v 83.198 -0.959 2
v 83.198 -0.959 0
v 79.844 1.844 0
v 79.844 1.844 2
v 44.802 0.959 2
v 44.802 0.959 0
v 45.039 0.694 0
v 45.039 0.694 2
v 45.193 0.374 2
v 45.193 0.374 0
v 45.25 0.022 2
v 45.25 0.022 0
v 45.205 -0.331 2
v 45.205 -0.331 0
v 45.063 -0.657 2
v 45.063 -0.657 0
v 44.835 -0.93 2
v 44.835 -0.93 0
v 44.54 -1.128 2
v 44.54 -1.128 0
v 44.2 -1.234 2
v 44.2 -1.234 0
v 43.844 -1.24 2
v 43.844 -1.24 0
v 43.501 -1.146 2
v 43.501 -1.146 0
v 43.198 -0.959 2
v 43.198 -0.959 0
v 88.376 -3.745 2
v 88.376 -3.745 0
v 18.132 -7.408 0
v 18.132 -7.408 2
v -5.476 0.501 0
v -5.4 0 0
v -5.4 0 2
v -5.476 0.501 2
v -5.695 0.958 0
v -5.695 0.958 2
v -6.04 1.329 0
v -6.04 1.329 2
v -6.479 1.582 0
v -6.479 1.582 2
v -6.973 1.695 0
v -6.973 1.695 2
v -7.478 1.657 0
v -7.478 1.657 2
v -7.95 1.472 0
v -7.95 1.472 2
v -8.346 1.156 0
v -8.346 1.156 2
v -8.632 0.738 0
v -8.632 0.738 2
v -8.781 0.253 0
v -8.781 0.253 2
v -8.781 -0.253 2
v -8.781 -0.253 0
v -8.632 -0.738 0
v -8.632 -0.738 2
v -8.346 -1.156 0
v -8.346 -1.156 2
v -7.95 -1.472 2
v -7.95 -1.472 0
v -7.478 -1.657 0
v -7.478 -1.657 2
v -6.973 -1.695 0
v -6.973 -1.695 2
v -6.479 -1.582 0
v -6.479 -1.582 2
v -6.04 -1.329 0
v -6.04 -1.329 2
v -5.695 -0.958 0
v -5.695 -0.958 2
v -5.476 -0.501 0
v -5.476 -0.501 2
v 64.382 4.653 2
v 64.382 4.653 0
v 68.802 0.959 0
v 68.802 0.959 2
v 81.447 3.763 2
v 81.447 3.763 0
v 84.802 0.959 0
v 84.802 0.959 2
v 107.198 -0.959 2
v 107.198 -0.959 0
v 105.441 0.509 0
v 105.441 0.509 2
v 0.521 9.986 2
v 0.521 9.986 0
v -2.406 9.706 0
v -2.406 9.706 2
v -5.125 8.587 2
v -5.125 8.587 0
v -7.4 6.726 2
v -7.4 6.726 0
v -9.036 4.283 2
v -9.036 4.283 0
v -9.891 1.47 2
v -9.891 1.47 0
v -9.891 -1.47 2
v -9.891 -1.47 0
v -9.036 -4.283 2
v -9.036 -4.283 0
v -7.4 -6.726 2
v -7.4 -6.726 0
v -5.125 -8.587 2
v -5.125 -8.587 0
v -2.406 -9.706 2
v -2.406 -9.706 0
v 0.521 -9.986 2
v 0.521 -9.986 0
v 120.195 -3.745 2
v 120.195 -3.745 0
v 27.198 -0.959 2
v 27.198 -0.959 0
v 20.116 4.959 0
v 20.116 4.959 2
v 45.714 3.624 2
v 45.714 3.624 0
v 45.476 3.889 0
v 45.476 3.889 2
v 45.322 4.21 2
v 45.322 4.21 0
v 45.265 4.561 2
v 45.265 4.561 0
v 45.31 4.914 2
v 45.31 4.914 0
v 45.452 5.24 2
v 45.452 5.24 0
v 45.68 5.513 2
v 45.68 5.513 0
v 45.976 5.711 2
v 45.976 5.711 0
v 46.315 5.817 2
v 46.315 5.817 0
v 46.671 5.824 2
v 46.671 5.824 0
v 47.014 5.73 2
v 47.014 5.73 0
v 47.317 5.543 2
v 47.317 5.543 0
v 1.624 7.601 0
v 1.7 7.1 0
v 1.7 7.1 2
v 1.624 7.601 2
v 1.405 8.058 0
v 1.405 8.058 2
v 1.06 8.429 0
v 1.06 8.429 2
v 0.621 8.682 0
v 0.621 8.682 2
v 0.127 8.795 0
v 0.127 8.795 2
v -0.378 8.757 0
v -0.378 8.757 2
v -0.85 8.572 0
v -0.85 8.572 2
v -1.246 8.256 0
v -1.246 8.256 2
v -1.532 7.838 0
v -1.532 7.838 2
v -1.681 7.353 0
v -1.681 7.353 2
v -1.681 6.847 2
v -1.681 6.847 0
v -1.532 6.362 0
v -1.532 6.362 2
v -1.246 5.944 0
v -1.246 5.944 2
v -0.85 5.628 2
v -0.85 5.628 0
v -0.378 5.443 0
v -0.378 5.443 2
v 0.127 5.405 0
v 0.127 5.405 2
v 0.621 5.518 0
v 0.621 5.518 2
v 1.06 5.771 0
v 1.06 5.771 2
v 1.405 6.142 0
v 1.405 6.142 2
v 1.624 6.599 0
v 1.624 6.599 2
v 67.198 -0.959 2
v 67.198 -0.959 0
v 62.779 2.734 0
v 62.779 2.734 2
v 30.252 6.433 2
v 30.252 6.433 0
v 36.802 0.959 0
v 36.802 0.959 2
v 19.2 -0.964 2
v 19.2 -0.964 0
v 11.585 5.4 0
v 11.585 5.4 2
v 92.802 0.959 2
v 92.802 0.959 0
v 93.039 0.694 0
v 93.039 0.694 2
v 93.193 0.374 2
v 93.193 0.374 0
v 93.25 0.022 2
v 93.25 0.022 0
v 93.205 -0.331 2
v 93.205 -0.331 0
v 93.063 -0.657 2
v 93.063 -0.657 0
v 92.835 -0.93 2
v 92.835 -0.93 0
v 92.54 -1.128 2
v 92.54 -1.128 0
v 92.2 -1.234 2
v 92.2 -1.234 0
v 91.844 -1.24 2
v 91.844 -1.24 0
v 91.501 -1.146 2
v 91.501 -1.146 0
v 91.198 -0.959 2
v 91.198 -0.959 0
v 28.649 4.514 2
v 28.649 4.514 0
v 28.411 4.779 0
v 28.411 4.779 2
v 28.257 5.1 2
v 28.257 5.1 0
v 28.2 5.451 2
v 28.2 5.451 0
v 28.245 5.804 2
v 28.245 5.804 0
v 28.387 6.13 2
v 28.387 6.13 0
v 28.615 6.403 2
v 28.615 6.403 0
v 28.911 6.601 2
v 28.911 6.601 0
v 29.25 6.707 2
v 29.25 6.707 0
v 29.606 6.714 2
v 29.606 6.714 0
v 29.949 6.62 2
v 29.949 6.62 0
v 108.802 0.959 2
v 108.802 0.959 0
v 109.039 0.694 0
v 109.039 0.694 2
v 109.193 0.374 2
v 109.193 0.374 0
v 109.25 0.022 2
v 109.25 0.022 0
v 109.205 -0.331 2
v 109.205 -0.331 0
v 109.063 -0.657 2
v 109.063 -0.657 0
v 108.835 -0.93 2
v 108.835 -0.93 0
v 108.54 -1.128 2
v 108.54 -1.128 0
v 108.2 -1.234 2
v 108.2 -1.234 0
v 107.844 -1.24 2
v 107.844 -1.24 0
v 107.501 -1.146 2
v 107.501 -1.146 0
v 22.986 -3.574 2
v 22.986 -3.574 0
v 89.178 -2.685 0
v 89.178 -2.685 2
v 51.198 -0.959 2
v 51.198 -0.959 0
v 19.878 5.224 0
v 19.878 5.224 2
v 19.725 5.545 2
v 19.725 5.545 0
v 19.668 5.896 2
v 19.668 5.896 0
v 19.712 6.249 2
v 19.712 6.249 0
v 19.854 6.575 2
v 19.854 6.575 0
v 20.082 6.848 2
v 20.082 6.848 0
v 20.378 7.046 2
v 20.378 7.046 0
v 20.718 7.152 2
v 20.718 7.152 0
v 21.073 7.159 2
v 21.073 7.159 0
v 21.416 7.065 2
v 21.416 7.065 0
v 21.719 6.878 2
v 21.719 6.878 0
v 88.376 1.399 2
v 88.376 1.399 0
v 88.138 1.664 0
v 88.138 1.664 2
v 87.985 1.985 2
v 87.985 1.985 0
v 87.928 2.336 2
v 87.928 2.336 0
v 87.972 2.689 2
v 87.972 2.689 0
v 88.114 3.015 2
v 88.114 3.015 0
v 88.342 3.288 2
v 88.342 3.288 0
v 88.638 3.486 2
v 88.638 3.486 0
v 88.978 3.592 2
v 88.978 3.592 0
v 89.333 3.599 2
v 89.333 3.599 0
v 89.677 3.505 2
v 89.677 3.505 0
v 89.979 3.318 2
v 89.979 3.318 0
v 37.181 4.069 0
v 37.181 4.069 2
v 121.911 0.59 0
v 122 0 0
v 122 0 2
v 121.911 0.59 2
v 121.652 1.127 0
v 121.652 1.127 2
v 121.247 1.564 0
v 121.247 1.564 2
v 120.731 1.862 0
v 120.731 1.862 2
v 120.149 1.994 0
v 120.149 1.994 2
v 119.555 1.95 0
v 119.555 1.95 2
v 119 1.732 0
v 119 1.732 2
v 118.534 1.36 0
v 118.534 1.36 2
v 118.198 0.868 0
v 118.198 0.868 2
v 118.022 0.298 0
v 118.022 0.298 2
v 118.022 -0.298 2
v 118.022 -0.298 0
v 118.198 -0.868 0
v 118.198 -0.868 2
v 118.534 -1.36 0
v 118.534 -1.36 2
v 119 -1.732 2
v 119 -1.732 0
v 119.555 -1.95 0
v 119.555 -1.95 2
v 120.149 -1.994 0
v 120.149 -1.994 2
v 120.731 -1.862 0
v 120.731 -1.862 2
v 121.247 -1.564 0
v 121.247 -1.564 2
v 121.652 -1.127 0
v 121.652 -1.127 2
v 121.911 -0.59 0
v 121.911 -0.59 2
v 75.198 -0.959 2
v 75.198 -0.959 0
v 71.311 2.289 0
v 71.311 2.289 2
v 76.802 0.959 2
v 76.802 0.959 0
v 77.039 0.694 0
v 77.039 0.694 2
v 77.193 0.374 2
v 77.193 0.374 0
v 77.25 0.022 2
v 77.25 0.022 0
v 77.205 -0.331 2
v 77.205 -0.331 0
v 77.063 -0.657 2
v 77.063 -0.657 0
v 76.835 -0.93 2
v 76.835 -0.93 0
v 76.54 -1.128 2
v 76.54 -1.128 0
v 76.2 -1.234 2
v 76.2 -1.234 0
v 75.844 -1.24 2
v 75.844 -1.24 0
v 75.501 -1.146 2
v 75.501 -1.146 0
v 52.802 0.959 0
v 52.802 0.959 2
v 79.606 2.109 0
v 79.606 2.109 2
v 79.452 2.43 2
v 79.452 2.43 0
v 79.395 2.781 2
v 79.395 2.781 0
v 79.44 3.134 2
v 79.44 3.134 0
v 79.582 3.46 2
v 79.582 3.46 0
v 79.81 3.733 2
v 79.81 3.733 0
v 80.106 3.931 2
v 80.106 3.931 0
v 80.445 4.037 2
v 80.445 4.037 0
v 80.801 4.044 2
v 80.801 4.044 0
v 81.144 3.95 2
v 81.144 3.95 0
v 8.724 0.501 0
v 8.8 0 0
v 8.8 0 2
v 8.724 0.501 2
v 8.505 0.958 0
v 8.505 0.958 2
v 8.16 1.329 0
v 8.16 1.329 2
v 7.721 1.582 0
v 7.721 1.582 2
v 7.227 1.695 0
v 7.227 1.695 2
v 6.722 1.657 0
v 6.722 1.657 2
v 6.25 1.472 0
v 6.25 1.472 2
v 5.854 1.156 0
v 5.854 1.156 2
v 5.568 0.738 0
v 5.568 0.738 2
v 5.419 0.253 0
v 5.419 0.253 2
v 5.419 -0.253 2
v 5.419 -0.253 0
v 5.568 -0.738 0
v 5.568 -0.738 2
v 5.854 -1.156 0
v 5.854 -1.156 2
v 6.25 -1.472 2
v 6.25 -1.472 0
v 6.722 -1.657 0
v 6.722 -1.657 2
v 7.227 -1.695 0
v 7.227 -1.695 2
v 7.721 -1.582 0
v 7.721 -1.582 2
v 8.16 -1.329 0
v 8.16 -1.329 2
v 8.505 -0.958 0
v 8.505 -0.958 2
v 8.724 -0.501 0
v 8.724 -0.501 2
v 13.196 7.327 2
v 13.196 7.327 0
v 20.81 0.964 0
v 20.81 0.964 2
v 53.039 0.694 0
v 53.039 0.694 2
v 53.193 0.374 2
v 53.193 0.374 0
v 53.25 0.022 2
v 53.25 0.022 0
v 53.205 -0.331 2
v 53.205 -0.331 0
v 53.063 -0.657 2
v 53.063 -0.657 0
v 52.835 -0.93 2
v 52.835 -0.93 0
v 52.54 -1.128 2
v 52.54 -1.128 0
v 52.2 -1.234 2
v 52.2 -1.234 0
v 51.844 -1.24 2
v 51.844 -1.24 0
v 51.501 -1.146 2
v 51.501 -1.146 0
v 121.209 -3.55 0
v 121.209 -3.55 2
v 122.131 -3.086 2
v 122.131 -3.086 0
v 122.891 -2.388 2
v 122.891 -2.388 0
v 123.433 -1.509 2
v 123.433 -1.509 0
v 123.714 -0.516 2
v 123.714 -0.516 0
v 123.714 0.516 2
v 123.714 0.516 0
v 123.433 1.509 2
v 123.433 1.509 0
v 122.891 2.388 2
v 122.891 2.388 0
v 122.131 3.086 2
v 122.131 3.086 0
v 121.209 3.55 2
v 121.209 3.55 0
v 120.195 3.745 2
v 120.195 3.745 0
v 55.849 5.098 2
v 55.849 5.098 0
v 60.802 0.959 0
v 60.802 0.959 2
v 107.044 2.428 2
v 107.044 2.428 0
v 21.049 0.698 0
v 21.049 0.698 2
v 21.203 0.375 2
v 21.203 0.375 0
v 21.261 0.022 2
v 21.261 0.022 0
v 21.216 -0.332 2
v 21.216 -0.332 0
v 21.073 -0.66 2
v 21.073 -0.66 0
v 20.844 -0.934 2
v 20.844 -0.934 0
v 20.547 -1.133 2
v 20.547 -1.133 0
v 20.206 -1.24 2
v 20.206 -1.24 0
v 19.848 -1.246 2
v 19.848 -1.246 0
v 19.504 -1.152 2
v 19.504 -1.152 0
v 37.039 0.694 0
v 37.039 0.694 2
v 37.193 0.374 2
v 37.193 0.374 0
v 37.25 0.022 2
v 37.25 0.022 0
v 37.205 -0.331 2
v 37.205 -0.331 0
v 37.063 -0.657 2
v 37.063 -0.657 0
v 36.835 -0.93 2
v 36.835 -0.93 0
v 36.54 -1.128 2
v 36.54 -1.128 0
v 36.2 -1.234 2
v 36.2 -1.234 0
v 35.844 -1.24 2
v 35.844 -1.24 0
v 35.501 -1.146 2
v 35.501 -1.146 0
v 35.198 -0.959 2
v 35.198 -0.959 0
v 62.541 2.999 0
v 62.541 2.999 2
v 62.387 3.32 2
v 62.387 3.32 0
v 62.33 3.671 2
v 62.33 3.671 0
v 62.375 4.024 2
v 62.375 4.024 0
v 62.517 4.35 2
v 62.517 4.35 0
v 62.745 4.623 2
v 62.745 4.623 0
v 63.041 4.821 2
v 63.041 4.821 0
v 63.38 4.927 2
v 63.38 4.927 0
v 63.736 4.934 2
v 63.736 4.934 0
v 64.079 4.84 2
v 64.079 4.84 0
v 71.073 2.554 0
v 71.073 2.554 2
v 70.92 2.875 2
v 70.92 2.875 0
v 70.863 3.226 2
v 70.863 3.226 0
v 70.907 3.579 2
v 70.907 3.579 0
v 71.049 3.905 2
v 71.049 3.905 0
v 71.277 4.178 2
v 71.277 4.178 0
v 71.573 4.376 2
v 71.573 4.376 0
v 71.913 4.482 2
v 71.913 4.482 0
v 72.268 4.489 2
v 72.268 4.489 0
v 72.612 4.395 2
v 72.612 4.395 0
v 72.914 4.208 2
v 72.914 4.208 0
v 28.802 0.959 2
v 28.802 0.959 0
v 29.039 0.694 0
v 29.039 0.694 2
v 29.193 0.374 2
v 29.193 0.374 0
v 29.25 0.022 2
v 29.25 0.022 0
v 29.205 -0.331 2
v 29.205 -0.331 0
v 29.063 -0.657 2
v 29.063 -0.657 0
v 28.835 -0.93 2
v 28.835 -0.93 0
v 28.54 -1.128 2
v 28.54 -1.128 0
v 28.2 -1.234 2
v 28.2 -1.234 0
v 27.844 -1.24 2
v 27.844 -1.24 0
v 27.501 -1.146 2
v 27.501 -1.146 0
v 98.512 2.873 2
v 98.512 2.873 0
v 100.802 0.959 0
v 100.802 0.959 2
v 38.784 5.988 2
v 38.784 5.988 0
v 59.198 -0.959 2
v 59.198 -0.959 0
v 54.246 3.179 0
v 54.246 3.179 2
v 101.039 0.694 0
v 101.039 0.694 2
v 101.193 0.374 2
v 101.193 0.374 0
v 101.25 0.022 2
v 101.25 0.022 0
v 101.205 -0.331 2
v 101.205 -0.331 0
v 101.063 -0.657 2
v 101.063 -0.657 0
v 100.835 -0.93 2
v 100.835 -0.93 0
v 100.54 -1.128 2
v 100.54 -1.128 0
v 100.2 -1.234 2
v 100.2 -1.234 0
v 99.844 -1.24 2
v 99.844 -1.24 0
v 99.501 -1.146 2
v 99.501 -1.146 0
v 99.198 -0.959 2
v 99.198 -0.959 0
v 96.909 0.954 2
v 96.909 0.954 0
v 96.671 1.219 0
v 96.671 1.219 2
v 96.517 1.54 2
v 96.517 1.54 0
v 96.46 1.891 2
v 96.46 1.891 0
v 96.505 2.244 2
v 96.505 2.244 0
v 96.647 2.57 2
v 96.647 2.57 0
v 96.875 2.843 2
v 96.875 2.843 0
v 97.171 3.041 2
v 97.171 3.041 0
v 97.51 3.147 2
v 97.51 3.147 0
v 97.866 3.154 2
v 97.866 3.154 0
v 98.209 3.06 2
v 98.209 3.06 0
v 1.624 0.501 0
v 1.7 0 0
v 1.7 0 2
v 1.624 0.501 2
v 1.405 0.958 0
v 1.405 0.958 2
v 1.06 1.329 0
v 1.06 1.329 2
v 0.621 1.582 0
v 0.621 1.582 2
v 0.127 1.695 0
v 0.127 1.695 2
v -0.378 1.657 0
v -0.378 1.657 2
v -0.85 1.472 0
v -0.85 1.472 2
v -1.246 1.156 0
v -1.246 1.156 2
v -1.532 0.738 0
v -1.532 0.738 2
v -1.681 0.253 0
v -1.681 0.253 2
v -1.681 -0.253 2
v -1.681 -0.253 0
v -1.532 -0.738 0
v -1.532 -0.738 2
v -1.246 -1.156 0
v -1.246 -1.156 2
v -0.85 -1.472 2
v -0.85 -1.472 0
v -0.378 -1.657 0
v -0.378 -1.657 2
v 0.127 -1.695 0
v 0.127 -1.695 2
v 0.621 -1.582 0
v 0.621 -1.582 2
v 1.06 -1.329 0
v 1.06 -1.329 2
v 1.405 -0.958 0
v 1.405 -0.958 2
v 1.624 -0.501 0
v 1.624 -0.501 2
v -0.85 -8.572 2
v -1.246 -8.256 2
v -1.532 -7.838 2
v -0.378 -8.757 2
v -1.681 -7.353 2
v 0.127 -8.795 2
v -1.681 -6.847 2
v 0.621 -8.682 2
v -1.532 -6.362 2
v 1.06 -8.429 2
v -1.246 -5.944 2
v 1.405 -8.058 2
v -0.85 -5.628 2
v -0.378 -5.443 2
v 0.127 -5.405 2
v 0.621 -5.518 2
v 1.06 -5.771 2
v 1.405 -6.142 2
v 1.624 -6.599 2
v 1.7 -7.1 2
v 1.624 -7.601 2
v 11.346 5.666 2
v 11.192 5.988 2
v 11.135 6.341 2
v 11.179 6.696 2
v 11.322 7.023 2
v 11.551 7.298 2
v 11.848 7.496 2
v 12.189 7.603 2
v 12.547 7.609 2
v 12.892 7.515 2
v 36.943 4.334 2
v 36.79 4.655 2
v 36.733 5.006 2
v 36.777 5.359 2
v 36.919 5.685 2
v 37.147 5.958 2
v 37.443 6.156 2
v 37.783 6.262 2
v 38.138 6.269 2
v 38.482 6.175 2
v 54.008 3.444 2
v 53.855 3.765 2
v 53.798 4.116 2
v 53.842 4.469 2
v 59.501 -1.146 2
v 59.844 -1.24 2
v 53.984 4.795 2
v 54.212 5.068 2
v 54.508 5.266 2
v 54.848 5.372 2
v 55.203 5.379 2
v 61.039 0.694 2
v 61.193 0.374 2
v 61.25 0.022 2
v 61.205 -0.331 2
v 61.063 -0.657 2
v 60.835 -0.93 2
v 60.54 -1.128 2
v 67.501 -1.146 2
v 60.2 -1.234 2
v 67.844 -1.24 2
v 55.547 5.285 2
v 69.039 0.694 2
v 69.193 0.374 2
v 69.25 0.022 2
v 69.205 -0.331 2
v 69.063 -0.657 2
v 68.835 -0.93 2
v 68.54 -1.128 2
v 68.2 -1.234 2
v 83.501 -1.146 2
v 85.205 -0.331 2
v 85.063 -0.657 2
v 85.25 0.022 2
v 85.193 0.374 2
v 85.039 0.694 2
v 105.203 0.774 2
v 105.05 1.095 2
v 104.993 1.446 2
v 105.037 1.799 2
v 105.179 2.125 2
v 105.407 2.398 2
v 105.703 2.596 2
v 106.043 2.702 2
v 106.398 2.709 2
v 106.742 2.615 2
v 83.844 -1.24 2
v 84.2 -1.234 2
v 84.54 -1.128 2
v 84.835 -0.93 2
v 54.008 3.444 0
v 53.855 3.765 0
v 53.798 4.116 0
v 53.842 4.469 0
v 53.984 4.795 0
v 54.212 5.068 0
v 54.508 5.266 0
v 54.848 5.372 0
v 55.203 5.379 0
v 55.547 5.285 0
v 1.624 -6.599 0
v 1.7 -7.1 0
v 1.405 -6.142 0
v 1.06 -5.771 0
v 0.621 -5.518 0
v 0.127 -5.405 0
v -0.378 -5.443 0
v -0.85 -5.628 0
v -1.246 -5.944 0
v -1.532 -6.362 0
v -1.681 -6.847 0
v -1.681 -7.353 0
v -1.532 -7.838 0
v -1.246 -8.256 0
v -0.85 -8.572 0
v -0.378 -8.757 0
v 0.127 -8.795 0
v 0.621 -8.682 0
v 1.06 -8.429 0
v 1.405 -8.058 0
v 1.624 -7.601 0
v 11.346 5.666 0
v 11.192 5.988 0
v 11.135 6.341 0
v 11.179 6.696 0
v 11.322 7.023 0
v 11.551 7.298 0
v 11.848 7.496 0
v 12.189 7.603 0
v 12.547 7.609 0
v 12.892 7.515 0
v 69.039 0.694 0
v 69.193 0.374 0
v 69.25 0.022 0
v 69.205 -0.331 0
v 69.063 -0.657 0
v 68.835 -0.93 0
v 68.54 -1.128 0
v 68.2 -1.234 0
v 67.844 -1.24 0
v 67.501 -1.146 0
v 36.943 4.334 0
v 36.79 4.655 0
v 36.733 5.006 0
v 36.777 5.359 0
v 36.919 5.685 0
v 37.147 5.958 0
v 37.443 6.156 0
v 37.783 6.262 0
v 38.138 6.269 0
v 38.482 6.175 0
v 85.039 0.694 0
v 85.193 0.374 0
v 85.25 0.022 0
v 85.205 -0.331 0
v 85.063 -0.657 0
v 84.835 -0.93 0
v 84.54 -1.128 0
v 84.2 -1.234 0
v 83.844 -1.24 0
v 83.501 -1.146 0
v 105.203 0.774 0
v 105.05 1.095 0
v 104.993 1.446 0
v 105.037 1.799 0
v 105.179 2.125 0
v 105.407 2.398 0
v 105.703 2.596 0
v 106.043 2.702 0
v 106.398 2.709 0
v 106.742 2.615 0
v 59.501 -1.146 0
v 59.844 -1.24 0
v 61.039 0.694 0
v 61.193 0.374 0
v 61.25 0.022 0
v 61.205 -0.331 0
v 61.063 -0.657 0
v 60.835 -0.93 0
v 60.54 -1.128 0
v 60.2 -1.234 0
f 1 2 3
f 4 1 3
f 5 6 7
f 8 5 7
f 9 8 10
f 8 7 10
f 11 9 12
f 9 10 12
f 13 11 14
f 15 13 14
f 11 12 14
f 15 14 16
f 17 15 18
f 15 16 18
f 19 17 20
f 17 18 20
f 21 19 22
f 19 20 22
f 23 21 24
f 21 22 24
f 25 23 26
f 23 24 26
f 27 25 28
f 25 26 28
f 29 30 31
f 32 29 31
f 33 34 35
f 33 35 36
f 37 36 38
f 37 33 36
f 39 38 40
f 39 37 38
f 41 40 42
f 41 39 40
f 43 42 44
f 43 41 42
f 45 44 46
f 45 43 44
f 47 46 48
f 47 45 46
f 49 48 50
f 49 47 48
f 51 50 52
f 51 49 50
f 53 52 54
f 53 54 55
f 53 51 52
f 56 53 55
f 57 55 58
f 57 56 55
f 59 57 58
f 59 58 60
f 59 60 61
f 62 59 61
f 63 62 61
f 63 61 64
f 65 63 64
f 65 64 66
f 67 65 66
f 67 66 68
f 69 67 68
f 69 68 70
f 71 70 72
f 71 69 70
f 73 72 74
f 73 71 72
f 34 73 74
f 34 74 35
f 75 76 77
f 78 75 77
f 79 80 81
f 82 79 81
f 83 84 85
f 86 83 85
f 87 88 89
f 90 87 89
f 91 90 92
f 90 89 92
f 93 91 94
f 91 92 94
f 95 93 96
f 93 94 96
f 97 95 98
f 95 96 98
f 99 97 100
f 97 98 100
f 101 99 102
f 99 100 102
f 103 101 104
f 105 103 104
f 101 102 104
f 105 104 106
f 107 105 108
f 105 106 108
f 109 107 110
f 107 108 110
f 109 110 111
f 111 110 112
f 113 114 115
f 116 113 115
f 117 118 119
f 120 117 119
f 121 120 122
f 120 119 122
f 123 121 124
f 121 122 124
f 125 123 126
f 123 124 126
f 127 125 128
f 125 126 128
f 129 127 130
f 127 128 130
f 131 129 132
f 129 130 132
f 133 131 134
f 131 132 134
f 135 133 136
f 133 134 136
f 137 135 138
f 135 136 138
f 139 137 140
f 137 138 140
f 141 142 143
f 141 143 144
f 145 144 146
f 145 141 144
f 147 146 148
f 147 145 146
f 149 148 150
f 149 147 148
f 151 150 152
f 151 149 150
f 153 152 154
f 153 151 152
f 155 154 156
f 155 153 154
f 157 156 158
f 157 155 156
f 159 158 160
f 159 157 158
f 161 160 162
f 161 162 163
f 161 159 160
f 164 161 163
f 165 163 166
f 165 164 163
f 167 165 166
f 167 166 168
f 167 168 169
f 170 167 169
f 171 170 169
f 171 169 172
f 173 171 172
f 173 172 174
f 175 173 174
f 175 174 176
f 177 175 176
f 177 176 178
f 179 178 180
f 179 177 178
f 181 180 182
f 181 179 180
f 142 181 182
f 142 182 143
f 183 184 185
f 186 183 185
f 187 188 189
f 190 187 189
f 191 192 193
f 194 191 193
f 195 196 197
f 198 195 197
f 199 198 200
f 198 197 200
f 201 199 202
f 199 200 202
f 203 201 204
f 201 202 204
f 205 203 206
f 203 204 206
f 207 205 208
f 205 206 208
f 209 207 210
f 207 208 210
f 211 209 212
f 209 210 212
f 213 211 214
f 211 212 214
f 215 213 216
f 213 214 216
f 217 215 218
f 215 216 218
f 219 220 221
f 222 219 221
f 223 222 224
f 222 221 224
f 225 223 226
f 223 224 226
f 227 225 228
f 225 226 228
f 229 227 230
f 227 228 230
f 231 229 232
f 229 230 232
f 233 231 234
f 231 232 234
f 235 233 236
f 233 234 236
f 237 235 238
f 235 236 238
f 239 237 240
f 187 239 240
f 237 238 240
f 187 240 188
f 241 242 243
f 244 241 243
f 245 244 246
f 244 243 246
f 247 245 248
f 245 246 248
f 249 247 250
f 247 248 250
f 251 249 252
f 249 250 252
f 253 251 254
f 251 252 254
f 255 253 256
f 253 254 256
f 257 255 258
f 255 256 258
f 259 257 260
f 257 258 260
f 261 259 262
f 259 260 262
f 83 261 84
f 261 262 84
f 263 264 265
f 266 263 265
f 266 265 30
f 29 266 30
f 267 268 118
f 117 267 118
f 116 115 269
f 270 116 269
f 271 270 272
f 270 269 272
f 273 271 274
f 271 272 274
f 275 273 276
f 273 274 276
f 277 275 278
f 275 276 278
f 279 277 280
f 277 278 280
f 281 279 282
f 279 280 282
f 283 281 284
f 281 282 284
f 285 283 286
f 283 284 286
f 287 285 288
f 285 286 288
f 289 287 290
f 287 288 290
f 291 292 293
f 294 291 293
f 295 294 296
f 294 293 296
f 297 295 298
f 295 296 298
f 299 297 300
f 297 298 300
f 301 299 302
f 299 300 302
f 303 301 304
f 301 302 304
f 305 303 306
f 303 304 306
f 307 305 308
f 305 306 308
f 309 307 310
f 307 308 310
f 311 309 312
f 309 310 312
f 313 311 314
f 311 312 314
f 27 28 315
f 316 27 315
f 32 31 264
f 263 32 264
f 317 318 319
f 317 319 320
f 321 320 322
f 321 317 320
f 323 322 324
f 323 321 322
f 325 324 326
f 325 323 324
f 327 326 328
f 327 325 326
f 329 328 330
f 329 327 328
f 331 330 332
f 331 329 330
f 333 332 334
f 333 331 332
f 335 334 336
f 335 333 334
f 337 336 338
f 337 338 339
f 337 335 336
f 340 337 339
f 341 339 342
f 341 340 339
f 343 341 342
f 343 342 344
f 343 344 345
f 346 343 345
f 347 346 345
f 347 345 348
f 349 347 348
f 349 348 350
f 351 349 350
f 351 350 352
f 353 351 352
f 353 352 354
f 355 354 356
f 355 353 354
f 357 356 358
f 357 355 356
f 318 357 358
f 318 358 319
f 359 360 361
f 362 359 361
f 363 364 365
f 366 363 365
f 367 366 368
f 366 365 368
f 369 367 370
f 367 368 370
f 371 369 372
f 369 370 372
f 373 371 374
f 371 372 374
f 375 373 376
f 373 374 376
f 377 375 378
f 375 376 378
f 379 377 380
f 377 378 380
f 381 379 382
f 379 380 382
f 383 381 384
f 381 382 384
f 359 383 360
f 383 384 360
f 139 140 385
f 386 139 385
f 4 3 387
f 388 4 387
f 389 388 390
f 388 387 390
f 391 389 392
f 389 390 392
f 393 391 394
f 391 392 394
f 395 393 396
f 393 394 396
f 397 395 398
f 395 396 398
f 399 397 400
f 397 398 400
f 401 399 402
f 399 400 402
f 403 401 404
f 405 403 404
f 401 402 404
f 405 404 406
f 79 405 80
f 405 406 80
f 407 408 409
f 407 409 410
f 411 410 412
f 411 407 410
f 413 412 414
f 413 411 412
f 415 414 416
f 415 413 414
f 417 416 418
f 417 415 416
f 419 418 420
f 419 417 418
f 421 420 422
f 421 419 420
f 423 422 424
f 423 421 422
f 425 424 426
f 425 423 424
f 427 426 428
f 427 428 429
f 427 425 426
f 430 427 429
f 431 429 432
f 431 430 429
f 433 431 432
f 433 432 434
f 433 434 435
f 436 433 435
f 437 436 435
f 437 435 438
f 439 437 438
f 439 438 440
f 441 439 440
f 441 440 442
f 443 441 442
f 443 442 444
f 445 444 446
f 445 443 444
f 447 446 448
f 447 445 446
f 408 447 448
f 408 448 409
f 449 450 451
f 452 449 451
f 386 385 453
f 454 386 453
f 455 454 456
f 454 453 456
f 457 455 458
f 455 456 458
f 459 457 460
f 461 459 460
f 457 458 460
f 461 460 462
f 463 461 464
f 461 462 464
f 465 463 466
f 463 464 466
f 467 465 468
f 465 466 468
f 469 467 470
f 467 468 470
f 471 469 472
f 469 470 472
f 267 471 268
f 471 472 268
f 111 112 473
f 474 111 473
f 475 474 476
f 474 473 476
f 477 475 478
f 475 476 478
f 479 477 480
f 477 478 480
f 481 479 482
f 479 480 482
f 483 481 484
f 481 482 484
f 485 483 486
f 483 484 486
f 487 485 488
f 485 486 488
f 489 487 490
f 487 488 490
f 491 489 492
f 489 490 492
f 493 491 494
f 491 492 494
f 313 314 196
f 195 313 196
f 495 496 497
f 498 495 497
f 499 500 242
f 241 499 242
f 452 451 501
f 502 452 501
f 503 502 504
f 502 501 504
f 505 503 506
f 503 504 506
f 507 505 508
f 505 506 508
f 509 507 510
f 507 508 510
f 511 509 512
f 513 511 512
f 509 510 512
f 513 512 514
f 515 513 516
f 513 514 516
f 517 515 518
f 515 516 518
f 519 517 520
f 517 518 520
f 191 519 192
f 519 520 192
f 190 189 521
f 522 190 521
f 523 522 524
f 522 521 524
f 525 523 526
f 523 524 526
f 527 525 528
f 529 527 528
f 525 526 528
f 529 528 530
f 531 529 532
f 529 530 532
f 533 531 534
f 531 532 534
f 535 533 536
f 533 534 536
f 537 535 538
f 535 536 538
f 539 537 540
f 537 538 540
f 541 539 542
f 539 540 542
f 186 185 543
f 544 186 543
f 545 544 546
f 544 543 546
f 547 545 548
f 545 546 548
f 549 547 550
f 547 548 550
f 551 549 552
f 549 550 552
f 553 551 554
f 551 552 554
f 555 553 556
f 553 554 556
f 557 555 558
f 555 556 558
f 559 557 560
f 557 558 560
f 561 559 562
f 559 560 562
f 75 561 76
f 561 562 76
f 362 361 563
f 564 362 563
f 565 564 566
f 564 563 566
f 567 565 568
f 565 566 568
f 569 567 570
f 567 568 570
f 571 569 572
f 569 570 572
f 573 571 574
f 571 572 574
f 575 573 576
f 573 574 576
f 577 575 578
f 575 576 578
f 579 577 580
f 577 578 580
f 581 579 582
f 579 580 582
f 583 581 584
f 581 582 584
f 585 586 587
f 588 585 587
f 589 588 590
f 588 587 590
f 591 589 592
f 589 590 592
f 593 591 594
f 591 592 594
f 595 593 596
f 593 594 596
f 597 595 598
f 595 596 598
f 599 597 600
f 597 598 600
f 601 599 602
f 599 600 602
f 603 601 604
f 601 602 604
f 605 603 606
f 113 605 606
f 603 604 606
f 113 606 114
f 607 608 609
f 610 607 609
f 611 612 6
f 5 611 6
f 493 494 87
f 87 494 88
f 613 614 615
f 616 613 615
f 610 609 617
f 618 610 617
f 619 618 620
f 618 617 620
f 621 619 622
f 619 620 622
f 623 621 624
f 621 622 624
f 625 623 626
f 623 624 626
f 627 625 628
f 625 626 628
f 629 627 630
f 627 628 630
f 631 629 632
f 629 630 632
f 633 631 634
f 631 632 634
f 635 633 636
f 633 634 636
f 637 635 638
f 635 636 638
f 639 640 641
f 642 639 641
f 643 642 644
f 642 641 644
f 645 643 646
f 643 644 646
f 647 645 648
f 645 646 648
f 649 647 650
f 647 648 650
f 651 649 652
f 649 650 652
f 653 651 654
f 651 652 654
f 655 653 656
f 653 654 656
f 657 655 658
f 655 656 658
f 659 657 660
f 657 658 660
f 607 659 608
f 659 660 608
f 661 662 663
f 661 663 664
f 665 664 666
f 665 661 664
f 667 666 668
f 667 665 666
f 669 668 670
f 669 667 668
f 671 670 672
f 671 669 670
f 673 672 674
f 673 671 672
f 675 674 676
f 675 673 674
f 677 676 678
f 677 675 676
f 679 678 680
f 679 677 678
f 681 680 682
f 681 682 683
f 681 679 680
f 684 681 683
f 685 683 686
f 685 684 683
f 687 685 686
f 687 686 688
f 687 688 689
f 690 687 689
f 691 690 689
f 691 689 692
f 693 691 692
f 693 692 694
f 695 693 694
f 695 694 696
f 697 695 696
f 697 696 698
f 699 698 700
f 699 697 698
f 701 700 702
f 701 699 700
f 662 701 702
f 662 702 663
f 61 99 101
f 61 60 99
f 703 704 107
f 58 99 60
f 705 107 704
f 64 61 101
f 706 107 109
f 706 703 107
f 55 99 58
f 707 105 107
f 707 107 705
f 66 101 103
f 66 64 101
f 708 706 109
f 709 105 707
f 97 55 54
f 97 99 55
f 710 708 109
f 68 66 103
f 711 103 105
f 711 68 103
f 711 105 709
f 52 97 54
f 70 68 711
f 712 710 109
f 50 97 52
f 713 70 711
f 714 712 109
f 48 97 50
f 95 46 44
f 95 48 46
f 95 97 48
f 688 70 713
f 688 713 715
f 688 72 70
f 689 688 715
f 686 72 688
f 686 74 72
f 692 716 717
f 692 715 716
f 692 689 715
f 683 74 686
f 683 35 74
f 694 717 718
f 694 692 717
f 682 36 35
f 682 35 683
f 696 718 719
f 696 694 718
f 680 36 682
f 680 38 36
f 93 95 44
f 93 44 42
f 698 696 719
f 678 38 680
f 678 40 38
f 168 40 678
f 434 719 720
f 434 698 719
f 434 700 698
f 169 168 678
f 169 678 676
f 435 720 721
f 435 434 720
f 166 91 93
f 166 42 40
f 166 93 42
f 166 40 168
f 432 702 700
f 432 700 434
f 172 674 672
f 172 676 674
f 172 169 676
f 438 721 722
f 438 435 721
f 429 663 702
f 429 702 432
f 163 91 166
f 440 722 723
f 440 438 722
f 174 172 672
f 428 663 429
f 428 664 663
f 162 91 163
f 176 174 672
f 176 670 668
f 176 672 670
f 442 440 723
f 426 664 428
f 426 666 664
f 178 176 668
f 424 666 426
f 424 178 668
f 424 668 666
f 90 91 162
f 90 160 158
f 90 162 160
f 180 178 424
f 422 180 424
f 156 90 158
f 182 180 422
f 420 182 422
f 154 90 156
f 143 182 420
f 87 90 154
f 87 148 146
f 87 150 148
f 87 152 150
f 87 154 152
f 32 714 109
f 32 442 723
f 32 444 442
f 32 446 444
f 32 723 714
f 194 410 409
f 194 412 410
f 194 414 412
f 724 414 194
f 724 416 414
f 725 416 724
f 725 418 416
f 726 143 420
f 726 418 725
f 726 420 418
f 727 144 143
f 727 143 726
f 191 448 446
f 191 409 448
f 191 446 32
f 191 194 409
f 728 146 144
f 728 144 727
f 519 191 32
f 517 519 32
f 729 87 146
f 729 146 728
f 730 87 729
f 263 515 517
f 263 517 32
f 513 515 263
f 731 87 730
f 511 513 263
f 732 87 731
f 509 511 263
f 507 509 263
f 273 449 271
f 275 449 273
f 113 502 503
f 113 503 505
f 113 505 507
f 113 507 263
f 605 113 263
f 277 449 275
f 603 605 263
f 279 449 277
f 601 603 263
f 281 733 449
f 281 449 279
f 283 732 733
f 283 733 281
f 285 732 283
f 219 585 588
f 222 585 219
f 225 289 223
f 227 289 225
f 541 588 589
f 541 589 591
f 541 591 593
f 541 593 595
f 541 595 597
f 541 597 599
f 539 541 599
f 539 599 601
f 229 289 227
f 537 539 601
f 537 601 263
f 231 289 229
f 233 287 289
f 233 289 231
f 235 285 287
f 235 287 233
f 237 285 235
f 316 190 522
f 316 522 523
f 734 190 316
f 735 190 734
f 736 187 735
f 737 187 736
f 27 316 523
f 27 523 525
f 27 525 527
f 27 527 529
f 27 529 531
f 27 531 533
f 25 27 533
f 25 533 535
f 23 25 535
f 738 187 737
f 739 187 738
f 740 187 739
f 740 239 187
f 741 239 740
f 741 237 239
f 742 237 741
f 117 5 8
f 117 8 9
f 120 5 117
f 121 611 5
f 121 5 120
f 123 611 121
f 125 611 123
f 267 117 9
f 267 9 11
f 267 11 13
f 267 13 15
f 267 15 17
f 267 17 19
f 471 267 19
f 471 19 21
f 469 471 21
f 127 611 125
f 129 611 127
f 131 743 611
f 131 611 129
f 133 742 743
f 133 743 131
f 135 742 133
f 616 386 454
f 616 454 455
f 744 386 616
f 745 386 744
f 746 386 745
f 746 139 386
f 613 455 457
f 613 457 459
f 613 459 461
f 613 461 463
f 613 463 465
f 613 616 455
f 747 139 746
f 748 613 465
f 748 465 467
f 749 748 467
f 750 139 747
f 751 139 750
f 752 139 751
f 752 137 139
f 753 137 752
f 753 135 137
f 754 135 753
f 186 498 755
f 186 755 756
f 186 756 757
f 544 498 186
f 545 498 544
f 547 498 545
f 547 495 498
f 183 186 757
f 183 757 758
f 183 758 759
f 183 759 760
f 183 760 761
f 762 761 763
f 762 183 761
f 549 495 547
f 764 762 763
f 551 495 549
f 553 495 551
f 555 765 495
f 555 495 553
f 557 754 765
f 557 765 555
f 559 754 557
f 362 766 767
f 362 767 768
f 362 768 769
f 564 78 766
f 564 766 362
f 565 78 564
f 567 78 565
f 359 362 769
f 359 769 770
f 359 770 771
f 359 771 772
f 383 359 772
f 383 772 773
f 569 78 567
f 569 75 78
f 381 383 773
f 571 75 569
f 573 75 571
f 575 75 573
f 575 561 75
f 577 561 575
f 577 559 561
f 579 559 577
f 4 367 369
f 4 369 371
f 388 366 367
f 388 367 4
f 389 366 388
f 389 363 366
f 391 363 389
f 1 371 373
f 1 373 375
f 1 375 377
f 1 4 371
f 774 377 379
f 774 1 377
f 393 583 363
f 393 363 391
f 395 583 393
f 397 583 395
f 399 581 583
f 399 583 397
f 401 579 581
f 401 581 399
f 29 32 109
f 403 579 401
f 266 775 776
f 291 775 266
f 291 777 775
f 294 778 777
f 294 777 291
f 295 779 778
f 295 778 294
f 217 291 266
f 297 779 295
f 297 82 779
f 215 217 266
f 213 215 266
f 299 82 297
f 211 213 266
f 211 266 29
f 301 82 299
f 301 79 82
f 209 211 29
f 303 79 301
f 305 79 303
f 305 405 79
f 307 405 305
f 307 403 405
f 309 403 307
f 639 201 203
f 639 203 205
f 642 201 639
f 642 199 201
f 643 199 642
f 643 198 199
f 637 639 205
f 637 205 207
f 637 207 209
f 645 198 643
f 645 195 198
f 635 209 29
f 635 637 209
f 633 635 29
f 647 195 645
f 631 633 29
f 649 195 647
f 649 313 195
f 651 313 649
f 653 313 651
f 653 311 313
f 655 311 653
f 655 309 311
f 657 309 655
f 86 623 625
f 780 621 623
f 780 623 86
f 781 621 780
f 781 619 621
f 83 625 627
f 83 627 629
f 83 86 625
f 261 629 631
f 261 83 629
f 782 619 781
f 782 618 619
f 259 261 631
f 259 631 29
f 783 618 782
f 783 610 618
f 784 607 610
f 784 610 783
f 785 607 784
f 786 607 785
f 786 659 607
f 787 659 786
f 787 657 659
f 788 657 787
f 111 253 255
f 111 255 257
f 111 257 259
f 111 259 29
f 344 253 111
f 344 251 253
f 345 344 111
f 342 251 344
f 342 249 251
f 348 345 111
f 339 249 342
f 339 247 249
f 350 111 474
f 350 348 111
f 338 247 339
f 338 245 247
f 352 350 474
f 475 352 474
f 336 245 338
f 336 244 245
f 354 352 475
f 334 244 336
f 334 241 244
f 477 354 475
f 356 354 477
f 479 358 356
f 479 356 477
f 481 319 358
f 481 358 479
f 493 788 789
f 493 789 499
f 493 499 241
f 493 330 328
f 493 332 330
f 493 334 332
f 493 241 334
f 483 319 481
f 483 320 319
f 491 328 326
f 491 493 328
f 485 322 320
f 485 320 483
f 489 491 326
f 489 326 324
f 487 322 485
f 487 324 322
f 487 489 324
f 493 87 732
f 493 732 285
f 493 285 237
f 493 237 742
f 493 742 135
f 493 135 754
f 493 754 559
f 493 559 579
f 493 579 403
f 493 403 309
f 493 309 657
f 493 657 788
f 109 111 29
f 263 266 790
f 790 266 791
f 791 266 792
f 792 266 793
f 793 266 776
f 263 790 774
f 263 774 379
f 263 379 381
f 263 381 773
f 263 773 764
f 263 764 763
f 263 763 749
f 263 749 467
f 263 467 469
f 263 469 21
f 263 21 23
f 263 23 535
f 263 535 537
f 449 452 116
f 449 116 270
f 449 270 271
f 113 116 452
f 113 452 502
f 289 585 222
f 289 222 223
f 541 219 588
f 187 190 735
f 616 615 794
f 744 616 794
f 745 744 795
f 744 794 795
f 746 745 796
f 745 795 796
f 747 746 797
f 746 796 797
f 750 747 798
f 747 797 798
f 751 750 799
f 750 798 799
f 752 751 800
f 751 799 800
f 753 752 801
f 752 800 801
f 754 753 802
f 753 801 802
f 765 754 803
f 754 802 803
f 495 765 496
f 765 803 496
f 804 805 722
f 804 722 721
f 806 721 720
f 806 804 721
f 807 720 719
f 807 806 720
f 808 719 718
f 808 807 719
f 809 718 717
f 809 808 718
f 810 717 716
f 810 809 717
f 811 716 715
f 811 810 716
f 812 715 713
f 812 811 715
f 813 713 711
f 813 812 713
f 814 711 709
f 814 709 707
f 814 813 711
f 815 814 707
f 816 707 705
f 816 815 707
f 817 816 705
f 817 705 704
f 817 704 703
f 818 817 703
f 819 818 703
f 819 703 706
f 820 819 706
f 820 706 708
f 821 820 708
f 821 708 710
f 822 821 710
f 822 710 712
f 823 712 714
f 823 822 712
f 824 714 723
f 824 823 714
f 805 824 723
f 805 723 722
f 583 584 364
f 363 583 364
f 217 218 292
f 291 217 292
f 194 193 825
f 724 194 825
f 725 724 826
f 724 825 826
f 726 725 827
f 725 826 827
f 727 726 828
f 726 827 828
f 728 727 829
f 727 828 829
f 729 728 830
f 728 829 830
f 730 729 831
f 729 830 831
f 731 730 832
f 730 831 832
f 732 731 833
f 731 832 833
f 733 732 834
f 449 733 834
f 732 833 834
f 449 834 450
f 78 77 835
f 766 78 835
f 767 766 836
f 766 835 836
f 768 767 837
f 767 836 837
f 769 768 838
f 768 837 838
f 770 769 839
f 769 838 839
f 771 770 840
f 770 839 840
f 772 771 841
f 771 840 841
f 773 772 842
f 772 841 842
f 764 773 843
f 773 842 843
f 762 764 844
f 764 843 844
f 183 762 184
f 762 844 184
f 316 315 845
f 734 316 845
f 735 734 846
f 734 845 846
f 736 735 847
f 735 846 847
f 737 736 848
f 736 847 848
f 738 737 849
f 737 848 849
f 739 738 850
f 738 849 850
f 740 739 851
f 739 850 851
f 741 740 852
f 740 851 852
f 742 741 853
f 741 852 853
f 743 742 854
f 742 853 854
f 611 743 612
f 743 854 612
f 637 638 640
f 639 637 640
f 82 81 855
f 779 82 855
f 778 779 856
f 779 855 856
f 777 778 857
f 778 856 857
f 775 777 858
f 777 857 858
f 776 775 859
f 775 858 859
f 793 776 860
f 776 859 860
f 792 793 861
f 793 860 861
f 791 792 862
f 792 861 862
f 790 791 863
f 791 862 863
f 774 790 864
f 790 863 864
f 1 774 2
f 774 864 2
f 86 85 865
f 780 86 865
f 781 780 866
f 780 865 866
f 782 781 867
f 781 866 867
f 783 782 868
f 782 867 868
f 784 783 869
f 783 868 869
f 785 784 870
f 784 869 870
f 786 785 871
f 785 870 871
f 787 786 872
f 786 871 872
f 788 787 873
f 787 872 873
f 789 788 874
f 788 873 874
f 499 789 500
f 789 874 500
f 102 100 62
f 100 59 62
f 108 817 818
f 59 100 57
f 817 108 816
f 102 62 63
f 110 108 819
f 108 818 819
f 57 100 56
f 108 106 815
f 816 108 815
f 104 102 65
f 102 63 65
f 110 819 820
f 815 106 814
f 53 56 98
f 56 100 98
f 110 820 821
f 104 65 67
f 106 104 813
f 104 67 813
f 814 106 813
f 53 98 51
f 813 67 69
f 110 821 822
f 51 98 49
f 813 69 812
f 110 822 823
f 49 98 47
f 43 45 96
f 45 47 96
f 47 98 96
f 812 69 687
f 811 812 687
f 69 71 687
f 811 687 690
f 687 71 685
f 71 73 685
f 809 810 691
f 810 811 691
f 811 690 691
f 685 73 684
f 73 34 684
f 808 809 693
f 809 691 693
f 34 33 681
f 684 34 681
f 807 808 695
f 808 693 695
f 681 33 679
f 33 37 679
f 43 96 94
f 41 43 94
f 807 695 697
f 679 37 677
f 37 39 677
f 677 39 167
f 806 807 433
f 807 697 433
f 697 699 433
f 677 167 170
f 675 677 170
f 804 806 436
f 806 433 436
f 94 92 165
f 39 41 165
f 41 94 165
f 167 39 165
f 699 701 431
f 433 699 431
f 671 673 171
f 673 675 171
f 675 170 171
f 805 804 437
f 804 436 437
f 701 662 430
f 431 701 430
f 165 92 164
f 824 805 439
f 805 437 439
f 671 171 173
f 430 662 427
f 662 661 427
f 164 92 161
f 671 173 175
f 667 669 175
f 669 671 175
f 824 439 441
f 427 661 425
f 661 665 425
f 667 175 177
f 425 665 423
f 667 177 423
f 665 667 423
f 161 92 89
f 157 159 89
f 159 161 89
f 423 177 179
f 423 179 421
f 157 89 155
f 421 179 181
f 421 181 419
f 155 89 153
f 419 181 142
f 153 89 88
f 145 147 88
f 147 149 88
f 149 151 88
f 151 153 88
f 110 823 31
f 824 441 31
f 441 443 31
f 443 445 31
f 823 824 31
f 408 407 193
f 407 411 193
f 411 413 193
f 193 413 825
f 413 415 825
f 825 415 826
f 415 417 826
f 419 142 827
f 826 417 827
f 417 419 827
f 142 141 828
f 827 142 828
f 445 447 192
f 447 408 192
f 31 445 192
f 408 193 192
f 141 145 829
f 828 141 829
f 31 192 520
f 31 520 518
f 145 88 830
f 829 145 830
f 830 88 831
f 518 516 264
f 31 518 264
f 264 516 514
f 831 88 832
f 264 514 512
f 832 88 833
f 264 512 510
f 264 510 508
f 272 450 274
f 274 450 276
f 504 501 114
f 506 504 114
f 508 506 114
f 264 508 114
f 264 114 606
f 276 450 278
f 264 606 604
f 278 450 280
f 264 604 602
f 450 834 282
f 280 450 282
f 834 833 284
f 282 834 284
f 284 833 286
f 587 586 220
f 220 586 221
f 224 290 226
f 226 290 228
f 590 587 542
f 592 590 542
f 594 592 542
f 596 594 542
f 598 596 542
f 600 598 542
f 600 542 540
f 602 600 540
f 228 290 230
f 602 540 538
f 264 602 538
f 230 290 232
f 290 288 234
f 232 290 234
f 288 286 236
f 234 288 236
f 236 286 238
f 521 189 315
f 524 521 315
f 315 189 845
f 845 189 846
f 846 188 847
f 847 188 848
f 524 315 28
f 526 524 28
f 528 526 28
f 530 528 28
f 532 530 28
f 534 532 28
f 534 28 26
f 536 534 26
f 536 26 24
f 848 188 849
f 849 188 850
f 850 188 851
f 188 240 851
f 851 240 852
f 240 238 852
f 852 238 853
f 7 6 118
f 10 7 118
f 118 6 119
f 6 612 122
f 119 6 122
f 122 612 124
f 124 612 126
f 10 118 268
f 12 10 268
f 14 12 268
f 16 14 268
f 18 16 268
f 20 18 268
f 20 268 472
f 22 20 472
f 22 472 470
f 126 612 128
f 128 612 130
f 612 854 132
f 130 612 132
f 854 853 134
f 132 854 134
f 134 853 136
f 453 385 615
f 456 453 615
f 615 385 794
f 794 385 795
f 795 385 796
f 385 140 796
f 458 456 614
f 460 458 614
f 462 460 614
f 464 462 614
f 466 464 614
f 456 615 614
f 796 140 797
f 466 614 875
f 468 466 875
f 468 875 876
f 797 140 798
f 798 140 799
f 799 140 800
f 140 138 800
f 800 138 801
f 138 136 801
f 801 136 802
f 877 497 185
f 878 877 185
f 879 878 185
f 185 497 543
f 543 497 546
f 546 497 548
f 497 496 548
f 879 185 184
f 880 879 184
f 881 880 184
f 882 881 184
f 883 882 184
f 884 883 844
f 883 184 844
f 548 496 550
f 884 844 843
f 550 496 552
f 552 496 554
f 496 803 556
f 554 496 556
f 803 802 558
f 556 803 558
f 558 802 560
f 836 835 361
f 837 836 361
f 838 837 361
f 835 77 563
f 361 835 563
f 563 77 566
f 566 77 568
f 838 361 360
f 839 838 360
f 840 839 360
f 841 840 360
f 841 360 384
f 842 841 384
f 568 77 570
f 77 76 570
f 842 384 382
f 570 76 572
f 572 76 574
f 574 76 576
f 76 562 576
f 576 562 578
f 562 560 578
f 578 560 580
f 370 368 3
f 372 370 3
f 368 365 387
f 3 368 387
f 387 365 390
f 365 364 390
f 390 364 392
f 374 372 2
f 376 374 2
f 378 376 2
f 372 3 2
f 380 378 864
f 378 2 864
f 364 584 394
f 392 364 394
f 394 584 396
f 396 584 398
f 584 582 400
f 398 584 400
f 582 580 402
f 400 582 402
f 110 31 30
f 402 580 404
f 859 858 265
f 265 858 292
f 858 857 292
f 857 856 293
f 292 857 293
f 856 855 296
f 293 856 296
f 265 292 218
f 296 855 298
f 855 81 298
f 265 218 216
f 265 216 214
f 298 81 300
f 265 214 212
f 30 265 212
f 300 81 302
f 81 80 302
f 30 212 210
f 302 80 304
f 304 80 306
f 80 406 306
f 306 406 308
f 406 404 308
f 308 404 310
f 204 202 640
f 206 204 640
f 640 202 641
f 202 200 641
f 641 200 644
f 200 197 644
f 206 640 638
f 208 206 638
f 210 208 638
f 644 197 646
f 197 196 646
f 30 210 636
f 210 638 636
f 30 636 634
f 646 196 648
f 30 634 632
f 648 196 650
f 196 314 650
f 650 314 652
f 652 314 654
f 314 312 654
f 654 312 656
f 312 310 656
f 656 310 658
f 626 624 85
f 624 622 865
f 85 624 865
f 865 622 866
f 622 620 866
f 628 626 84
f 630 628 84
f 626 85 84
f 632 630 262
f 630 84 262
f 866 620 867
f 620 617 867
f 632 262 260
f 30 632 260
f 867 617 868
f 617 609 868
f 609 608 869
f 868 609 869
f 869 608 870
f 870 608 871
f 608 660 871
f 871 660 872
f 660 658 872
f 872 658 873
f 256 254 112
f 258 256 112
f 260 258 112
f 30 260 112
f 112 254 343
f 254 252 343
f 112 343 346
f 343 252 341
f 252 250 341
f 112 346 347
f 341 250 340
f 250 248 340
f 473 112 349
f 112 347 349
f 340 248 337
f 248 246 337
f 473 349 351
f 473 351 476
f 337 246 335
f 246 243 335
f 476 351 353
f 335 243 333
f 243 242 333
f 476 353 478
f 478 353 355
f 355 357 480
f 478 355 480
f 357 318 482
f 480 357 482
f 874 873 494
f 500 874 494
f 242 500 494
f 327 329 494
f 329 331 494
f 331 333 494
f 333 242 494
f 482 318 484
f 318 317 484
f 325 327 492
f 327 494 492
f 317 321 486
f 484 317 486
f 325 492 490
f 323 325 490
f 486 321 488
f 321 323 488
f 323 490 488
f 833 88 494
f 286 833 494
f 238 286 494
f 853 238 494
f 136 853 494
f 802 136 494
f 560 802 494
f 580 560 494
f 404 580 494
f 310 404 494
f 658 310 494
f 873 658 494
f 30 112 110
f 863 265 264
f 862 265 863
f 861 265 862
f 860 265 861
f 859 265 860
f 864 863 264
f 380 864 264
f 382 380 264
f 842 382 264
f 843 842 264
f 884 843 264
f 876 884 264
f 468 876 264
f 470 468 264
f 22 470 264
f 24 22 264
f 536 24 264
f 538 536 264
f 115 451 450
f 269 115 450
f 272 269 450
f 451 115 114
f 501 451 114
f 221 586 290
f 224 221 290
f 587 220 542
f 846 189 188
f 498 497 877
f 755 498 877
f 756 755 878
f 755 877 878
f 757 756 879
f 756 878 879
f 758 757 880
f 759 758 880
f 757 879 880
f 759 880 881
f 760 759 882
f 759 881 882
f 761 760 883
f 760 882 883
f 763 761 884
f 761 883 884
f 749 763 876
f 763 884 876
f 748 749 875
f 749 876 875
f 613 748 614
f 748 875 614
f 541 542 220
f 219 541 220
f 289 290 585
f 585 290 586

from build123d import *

# Parameters (mm, degrees)
SKETCH_2_R      = 1.7
SKETCH_2_R_2    = 2
EXTRUDE_1_DEPTH = 2


with BuildPart() as part:
    # 草图2 → 凸台-拉伸1 (new body)
    with BuildSketch(Plane.XY):
        with BuildLine():
            Line((120.1953125, 3.744910283), (0.520833333, 9.986427421))
            ThreePointArc((0.520833333, 9.986427421), (-10, 0), (0.520833333, -9.986427421))
            Line((0.520833333, -9.986427421), (120.1953125, -3.744910283))
            ThreePointArc((120.1953125, -3.744910283), (123.75, 0), (120.1953125, 3.744910283))
        make_face()
        with Locations((0, 7.1)):
            Circle(SKETCH_2_R, mode=Mode.SUBTRACT)
        Circle(SKETCH_2_R, mode=Mode.SUBTRACT)
        with Locations((7.1, 0)):
            Circle(SKETCH_2_R, mode=Mode.SUBTRACT)
        with Locations((-7.1, 0)):
            Circle(SKETCH_2_R, mode=Mode.SUBTRACT)
        with Locations((0, -7.1)):
            Circle(SKETCH_2_R, mode=Mode.SUBTRACT)
        with Locations((120, 0)):
            Circle(SKETCH_2_R_2, mode=Mode.SUBTRACT)
        with BuildLine():
            Line((19.199560495, -0.96370295), (11.58500645, 5.399602936))
            ThreePointArc((11.58500645, 5.399602936), (11.426647663, 7.168650049), (13.195694776, 7.327008836))
            Line((13.195694776, 7.327008836), (20.810248822, 0.96370295))
            ThreePointArc((20.810248822, 0.96370295), (20.968607609, -0.805344163), (19.199560495, -0.96370295))
        make_face(mode=Mode.SUBTRACT)
        with BuildLine():
            Line((27.198443723, -0.959170233), (20.116072333, 4.959402974))
            ThreePointArc((20.116072333, 4.959402974), (19.958458377, 6.720129483), (21.719184886, 6.87774344))
            Line((21.719184886, 6.87774344), (28.801556277, 0.959170233))
            ThreePointArc((28.801556277, 0.959170233), (28.959170233, -0.801556277), (27.198443723, -0.959170233))
        make_face(mode=Mode.SUBTRACT)
        with BuildLine():
            Line((35.198443723, -0.959170233), (28.64858146, 4.51439747))
            ThreePointArc((28.64858146, 4.51439747), (28.490967504, 6.275123979), (30.251694013, 6.432737935))
            Line((30.251694013, 6.432737935), (36.801556277, 0.959170233))
            ThreePointArc((36.801556277, 0.959170233), (36.959170233, -0.801556277), (35.198443723, -0.959170233))
        make_face(mode=Mode.SUBTRACT)
        with BuildLine():
            Line((43.198443723, -0.959170233), (37.181090587, 4.069391965))
            ThreePointArc((37.181090587, 4.069391965), (37.023476631, 5.830118475), (38.784203141, 5.987732431))
            Line((38.784203141, 5.987732431), (44.801556277, 0.959170233))
            ThreePointArc((44.801556277, 0.959170233), (44.959170233, -0.801556277), (43.198443723, -0.959170233))
        make_face(mode=Mode.SUBTRACT)
        with BuildLine():
            Line((51.198443723, -0.959170233), (45.713599714, 3.624386461))
            ThreePointArc((45.713599714, 3.624386461), (45.555985758, 5.38511297), (47.316712268, 5.542726927))
            Line((47.316712268, 5.542726927), (52.801556277, 0.959170233))
            ThreePointArc((52.801556277, 0.959170233), (52.959170233, -0.801556277), (51.198443723, -0.959170233))
        make_face(mode=Mode.SUBTRACT)
        with BuildLine():
            Line((59.198443723, -0.959170233), (54.246108842, 3.179380957))
            ThreePointArc((54.246108842, 3.179380957), (54.088494885, 4.940107466), (55.849221395, 5.097721422))
            Line((55.849221395, 5.097721422), (60.801556277, 0.959170233))
            ThreePointArc((60.801556277, 0.959170233), (60.959170233, -0.801556277), (59.198443723, -0.959170233))
        make_face(mode=Mode.SUBTRACT)
        with BuildLine():
            Line((67.198443723, -0.959170233), (62.778617969, 2.734375453))
            ThreePointArc((62.778617969, 2.734375453), (62.621004012, 4.495101962), (64.381730522, 4.652715918))
            Line((64.381730522, 4.652715918), (68.801556277, 0.959170233))
            ThreePointArc((68.801556277, 0.959170233), (68.959170233, -0.801556277), (67.198443723, -0.959170233))
        make_face(mode=Mode.SUBTRACT)
        with BuildLine():
            Line((75.198443723, -0.959170233), (71.311127096, 2.289369948))
            ThreePointArc((71.311127096, 2.289369948), (71.153513139, 4.050096458), (72.914239649, 4.207710414))
            Line((72.914239649, 4.207710414), (76.801556277, 0.959170233))
            ThreePointArc((76.801556277, 0.959170233), (76.959170233, -0.801556277), (75.198443723, -0.959170233))
        make_face(mode=Mode.SUBTRACT)
        with BuildLine():
            Line((83.198443723, -0.959170233), (79.843636223, 1.844364444))
            ThreePointArc((79.843636223, 1.844364444), (79.686022267, 3.605090953), (81.446748776, 3.76270491))
            Line((81.446748776, 3.76270491), (84.801556277, 0.959170233))
            ThreePointArc((84.801556277, 0.959170233), (84.959170233, -0.801556277), (83.198443723, -0.959170233))
        make_face(mode=Mode.SUBTRACT)
        with BuildLine():
            Line((91.198443723, -0.959170233), (88.37614535, 1.39935894))
            ThreePointArc((88.37614535, 1.39935894), (88.218531394, 3.160085449), (89.979257903, 3.317699405))
            Line((89.979257903, 3.317699405), (92.801556277, 0.959170233))
            ThreePointArc((92.801556277, 0.959170233), (92.959170233, -0.801556277), (91.198443723, -0.959170233))
        make_face(mode=Mode.SUBTRACT)
        with BuildLine():
            Line((99.198443723, -0.959170233), (96.908654477, 0.954353436))
            ThreePointArc((96.908654477, 0.954353436), (96.751040521, 2.715079945), (98.51176703, 2.872693901))
            Line((98.51176703, 2.872693901), (100.801556277, 0.959170233))
            ThreePointArc((100.801556277, 0.959170233), (100.959170233, -0.801556277), (99.198443723, -0.959170233))
        make_face(mode=Mode.SUBTRACT)
        with BuildLine():
            Line((107.198443723, -0.959170233), (105.441163604, 0.509347931))
            ThreePointArc((105.441163604, 0.509347931), (105.283549648, 2.270074441), (107.044276157, 2.427688397))
            Line((107.044276157, 2.427688397), (108.801556277, 0.959170233))
            ThreePointArc((108.801556277, 0.959170233), (108.959170233, -0.801556277), (107.198443723, -0.959170233))
        make_face(mode=Mode.SUBTRACT)
        Polygon((22.985742471, -3.574018318), (89.177701626, -2.685452731), (88.37614535, -3.744910283), (18.132146509, -7.408424222), align=None, mode=Mode.SUBTRACT)
    extrude(amount=EXTRUDE_1_DEPTH)


solid = part.part
